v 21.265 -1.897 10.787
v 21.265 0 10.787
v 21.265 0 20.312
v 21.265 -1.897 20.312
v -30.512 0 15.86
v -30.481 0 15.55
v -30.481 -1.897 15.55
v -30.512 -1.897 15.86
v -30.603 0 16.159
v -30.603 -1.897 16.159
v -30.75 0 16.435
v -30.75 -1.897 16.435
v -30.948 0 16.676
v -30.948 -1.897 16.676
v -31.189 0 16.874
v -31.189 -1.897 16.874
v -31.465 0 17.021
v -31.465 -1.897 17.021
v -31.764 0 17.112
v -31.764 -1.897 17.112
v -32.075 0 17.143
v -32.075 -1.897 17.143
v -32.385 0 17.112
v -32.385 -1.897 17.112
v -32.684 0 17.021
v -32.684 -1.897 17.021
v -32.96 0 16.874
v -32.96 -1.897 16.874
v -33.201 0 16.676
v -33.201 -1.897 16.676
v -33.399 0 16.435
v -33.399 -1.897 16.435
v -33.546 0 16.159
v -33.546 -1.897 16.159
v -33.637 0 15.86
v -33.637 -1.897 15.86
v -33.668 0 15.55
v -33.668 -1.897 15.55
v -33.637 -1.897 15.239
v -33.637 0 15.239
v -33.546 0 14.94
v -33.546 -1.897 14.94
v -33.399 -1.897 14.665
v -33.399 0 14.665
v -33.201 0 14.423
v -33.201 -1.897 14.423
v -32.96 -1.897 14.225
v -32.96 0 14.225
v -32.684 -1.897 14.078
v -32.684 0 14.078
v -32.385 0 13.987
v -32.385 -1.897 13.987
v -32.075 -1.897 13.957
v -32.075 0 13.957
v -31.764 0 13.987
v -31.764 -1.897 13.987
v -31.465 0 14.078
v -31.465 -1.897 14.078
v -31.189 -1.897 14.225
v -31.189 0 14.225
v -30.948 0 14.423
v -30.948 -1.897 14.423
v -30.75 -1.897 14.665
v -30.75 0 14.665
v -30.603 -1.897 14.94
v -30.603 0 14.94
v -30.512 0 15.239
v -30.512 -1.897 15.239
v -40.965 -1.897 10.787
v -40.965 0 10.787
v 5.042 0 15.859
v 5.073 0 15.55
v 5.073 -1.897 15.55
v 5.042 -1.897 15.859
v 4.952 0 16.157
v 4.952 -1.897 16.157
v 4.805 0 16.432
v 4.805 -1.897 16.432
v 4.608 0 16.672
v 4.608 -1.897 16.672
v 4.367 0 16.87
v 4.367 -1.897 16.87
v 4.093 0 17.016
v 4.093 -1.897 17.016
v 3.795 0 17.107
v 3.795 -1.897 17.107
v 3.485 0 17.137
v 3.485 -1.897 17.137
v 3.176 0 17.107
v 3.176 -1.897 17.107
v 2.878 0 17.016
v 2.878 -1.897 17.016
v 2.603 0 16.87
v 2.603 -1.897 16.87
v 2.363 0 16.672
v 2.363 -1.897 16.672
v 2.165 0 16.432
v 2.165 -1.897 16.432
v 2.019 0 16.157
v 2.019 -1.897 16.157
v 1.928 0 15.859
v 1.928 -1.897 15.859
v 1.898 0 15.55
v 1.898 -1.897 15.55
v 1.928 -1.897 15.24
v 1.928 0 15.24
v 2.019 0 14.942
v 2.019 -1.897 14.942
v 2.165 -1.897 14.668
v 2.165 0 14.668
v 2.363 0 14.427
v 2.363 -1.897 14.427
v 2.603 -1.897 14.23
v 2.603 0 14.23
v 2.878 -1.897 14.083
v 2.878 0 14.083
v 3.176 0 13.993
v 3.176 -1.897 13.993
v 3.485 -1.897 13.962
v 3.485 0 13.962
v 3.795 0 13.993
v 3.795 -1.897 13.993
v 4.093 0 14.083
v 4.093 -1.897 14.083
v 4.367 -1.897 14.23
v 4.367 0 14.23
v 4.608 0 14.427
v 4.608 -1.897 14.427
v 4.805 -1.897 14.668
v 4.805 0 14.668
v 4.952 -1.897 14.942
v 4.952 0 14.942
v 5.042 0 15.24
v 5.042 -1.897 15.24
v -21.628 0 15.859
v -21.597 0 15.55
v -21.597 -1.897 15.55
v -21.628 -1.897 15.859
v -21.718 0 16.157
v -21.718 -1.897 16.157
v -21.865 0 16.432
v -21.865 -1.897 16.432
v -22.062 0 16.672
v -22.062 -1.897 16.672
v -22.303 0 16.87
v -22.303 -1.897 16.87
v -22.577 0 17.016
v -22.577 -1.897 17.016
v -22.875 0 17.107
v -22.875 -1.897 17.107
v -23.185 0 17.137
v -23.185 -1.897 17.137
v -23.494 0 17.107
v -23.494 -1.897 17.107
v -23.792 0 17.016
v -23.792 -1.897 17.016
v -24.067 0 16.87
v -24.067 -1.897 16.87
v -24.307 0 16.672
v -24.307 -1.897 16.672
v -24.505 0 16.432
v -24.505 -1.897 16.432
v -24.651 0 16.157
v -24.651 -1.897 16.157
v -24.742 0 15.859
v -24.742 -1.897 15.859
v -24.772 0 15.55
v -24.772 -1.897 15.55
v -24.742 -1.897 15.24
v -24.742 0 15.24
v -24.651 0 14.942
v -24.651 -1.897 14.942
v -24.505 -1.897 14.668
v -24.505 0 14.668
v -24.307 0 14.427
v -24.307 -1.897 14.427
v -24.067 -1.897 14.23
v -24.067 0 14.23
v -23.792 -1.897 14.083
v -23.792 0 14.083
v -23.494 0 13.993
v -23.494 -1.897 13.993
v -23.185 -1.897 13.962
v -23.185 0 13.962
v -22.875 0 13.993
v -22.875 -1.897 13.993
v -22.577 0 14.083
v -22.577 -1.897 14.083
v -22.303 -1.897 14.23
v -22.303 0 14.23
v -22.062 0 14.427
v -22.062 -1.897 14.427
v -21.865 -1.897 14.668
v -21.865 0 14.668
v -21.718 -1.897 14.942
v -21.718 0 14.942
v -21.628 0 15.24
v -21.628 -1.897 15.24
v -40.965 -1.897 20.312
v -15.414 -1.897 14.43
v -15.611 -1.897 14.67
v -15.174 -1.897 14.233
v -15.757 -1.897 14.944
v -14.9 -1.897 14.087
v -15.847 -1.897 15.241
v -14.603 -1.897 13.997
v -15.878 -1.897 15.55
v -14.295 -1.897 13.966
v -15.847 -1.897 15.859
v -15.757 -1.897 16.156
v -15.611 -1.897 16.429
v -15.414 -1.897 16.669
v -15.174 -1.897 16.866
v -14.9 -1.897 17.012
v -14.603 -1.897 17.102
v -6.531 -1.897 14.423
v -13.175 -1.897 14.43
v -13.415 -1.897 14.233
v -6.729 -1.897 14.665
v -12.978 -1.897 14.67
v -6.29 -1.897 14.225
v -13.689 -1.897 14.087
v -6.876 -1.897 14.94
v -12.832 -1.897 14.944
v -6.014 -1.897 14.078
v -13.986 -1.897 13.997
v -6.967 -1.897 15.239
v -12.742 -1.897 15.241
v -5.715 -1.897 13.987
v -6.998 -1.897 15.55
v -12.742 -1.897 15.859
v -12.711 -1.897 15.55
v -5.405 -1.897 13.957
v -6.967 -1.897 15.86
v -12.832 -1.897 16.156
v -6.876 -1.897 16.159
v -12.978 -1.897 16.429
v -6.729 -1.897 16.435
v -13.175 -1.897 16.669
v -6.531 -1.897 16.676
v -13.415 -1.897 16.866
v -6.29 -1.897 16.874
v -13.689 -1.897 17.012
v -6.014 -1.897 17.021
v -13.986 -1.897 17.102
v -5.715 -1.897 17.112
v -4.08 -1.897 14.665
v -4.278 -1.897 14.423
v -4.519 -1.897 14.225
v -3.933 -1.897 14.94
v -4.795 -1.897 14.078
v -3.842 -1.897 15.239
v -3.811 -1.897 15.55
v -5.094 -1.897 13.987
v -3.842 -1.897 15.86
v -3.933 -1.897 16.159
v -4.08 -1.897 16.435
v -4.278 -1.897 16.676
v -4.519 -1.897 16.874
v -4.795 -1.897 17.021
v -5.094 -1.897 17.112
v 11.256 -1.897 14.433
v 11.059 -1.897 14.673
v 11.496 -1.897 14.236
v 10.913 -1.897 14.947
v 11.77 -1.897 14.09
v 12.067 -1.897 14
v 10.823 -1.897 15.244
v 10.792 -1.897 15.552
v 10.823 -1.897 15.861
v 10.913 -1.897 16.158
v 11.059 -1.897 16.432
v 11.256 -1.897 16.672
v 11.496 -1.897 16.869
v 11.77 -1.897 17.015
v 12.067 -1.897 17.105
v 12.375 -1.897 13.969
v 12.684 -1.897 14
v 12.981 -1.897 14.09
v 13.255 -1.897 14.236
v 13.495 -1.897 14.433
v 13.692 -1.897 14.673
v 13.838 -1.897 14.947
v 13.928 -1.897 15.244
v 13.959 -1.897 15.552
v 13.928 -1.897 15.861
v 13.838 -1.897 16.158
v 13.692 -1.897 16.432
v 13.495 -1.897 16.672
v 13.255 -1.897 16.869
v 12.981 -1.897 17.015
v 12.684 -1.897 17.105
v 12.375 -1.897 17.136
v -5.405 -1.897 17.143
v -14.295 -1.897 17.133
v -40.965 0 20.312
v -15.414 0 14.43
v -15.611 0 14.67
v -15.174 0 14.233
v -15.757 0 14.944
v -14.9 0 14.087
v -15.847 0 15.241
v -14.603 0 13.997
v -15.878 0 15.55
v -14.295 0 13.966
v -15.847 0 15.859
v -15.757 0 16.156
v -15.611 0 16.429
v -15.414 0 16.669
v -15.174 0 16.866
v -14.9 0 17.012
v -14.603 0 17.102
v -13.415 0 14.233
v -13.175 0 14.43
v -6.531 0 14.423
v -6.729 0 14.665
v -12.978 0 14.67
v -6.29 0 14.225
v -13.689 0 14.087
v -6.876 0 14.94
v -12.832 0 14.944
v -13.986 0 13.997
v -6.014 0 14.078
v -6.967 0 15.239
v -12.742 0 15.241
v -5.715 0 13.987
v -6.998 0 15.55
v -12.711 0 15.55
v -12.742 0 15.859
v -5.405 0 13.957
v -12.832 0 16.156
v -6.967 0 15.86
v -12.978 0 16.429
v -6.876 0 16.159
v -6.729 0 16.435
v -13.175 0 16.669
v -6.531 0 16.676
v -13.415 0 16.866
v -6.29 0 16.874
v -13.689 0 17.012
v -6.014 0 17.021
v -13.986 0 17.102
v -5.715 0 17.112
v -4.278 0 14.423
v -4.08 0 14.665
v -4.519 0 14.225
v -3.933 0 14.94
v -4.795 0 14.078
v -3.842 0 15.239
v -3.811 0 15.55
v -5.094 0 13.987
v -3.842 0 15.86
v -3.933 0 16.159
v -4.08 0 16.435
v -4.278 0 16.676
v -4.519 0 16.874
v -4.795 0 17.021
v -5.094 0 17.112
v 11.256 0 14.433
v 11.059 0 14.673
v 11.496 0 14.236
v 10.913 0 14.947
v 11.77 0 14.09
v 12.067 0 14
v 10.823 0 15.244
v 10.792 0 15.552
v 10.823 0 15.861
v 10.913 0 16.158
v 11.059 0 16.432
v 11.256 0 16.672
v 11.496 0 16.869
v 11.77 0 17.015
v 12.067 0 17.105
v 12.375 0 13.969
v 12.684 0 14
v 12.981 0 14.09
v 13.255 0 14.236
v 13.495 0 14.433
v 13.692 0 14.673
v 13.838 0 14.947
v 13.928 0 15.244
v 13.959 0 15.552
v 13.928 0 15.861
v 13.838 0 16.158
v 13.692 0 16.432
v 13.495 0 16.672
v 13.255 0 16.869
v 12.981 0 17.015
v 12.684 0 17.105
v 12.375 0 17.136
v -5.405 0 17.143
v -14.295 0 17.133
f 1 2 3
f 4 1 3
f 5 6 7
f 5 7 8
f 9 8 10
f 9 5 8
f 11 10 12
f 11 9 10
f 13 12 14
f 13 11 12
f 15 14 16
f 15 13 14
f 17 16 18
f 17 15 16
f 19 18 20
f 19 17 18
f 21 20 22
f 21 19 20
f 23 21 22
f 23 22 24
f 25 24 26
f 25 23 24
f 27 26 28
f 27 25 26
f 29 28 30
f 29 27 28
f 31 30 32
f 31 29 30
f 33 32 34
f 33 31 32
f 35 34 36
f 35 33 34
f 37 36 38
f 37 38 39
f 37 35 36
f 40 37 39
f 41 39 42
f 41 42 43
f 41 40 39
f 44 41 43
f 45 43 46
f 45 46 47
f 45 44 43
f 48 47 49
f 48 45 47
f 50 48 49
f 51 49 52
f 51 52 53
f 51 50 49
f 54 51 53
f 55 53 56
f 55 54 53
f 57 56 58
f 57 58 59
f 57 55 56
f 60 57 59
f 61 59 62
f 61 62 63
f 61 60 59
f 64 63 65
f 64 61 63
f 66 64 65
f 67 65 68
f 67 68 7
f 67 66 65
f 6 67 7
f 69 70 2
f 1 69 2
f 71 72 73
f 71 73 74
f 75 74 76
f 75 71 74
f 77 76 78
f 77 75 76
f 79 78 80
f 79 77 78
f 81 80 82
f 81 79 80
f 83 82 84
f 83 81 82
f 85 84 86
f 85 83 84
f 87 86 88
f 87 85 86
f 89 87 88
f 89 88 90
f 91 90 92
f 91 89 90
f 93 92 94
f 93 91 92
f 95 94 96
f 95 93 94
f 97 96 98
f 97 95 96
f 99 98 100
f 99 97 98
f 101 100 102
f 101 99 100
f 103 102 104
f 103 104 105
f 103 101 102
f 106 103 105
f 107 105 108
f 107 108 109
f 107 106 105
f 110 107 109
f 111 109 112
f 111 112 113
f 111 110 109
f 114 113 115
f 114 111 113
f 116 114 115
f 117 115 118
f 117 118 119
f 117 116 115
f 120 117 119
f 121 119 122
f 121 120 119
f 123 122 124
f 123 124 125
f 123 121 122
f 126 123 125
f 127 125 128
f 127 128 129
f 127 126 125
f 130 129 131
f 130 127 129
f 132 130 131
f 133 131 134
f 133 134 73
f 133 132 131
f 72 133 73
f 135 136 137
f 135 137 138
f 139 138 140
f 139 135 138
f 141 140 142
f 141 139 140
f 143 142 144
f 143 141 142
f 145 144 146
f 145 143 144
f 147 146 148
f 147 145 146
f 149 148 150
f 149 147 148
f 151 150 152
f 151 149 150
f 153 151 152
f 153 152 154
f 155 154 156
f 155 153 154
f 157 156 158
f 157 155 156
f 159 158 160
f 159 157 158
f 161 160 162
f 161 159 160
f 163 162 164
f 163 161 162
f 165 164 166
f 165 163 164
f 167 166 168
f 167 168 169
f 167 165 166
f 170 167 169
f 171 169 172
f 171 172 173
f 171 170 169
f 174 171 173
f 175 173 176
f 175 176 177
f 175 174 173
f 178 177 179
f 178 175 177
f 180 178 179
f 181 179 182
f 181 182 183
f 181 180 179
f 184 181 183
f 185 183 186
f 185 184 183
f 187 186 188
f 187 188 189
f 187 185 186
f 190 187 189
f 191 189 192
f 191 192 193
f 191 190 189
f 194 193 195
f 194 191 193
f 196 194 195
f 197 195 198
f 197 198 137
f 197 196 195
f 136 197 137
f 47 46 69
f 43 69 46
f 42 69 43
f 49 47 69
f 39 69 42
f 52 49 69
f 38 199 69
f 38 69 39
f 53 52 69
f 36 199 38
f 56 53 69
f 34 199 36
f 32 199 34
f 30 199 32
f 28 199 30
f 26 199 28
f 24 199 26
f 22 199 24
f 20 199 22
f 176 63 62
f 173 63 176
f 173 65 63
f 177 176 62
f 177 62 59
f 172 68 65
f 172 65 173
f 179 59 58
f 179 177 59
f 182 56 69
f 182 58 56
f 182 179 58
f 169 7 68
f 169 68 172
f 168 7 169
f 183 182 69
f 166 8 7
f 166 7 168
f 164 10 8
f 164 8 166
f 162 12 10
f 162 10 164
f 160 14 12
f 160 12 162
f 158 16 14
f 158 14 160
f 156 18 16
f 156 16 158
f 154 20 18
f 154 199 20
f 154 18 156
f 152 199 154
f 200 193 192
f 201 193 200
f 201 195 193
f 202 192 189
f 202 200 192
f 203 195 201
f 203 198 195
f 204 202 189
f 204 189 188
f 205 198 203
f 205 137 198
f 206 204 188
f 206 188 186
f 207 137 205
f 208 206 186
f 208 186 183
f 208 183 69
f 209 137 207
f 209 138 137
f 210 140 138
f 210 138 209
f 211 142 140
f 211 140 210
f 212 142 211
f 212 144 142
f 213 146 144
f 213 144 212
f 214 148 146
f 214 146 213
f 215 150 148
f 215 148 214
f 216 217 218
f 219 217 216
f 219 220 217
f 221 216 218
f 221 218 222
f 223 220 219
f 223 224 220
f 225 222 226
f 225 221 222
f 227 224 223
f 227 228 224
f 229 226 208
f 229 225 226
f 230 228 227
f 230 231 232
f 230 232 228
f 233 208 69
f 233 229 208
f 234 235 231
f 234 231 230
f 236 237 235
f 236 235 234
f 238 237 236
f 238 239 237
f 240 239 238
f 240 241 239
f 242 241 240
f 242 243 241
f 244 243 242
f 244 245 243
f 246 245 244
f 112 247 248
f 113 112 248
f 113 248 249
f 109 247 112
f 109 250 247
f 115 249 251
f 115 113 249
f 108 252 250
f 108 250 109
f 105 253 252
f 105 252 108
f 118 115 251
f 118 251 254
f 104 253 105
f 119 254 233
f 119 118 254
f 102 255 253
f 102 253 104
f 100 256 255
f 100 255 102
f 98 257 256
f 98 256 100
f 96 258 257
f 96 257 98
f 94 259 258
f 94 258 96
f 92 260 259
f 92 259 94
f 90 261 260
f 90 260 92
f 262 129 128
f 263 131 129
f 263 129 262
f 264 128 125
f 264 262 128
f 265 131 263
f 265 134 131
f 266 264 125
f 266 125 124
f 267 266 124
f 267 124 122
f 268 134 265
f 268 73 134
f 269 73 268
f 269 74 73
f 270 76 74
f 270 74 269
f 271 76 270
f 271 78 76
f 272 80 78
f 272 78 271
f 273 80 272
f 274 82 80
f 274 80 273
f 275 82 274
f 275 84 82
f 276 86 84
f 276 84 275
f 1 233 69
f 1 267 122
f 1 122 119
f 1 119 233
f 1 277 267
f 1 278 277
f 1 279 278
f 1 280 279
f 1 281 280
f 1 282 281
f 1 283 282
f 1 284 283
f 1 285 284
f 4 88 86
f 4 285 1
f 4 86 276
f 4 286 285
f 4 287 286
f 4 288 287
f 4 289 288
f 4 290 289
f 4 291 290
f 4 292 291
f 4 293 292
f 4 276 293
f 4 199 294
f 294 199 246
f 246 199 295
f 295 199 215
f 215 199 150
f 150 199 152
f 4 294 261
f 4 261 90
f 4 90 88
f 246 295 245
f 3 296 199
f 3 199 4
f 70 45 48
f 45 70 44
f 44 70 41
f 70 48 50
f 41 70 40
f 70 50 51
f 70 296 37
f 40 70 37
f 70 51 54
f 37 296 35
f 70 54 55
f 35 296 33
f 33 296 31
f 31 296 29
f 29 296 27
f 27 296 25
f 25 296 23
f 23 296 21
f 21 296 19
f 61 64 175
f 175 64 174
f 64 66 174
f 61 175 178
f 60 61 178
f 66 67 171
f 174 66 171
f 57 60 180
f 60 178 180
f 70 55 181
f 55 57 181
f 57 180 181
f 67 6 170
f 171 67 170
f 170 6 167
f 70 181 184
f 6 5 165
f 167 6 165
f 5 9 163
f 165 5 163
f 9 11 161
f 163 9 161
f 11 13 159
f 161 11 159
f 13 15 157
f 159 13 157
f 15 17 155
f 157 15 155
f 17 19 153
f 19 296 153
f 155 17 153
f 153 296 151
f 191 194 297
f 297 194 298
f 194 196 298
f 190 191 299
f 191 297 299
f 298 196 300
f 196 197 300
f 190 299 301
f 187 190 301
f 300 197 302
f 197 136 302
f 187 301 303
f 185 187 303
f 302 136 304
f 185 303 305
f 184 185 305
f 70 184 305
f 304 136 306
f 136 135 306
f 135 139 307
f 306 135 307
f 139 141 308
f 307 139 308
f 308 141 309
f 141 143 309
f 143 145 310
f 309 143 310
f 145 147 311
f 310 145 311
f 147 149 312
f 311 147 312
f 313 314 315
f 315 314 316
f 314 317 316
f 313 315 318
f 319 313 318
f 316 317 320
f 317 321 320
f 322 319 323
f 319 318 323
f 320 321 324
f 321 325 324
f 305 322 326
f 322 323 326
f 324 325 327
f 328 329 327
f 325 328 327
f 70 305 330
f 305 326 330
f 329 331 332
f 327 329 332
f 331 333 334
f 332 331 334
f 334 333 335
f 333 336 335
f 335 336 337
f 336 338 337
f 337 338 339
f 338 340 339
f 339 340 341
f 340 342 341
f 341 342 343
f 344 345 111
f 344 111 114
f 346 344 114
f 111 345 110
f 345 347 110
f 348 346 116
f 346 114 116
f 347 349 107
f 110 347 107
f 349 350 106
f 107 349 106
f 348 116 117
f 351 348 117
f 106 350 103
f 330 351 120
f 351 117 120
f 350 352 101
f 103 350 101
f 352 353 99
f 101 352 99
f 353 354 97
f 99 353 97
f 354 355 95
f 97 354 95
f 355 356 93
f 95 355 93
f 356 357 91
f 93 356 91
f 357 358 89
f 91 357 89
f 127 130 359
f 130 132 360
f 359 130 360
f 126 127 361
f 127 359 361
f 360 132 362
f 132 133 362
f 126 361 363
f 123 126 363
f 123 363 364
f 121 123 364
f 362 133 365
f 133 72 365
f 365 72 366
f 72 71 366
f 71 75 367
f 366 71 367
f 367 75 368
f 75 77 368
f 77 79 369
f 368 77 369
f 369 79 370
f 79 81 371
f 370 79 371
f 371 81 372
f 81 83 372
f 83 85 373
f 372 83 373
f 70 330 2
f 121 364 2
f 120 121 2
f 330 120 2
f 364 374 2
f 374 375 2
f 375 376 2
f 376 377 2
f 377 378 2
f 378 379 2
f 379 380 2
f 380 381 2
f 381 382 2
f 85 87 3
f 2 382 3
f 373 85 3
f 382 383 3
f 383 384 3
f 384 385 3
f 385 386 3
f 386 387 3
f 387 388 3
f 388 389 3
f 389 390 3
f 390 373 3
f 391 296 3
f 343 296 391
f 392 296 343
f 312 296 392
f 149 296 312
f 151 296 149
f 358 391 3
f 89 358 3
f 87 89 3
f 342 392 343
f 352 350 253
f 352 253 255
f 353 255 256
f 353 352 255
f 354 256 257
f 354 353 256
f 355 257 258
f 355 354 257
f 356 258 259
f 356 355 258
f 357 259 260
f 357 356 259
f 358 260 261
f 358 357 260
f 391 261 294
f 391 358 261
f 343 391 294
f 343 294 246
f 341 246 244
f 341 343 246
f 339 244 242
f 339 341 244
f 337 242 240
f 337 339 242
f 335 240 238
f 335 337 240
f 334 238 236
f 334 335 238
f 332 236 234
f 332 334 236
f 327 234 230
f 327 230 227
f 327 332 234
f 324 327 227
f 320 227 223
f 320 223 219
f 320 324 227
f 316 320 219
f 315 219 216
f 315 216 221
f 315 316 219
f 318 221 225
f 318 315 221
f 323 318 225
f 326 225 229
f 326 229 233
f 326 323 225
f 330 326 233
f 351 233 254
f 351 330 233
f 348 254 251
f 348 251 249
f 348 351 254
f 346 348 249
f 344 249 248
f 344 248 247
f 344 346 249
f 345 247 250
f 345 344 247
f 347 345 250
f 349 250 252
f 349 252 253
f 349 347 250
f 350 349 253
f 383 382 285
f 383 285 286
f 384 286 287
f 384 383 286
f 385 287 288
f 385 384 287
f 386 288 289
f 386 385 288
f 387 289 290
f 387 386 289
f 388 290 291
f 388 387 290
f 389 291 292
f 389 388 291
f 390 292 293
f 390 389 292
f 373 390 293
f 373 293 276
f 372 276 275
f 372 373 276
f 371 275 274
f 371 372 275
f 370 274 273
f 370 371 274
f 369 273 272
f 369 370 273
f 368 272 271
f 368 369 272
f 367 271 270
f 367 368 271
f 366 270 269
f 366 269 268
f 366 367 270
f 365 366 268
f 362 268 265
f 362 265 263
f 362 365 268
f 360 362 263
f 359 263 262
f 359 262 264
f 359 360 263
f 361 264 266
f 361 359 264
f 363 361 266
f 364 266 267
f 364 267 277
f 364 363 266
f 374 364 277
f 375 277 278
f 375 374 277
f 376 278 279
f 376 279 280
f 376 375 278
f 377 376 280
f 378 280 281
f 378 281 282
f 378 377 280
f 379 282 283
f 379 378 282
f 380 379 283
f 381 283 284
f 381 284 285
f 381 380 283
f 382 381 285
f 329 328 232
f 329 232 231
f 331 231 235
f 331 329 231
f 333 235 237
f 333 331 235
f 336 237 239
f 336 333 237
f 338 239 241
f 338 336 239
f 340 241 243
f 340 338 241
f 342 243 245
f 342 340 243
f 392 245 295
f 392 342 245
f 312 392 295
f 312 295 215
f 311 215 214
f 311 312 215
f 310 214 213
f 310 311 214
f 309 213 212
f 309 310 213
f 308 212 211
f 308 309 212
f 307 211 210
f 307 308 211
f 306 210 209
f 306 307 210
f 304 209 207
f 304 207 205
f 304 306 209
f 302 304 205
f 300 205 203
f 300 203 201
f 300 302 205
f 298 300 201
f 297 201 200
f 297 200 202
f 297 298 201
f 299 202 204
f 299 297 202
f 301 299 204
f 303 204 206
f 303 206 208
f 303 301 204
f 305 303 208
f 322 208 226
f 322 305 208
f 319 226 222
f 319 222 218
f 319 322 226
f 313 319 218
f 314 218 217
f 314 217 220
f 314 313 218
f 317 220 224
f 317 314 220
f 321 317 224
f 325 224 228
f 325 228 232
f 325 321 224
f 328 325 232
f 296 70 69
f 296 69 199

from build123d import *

# Parameters (mm, degrees)
F0_W     = 62.23
F0_H     = 9.525
F0_R     = 1.593097
F0_R_2   = 1.5875
F0_R_3   = 1.58325
F1_DEPTH = 1.89738


with BuildPart() as f1:
    # F0 (on Front) → F1 (new body)
    with BuildSketch(Plane.XZ):
        with Locations((-9.849542, 15.549641)):
            Rectangle(F0_W, F0_H)
        with Locations((-32.074542, 15.549641)):
            Circle(F0_R, mode=Mode.SUBTRACT)
        with Locations((-23.184542, 15.549641)):
            Circle(F0_R_2, mode=Mode.SUBTRACT)
        with Locations((-14.294542, 15.549641)):
            Circle(F0_R_3, mode=Mode.SUBTRACT)
        with Locations((-5.404542, 15.549641)):
            Circle(F0_R, mode=Mode.SUBTRACT)
        with Locations((3.485458, 15.549641)):
            Circle(F0_R_2, mode=Mode.SUBTRACT)
        with Locations((12.375458, 15.552476)):
            Circle(F0_R_3, mode=Mode.SUBTRACT)
    extrude(amount=F1_DEPTH)


solid = f1.part
